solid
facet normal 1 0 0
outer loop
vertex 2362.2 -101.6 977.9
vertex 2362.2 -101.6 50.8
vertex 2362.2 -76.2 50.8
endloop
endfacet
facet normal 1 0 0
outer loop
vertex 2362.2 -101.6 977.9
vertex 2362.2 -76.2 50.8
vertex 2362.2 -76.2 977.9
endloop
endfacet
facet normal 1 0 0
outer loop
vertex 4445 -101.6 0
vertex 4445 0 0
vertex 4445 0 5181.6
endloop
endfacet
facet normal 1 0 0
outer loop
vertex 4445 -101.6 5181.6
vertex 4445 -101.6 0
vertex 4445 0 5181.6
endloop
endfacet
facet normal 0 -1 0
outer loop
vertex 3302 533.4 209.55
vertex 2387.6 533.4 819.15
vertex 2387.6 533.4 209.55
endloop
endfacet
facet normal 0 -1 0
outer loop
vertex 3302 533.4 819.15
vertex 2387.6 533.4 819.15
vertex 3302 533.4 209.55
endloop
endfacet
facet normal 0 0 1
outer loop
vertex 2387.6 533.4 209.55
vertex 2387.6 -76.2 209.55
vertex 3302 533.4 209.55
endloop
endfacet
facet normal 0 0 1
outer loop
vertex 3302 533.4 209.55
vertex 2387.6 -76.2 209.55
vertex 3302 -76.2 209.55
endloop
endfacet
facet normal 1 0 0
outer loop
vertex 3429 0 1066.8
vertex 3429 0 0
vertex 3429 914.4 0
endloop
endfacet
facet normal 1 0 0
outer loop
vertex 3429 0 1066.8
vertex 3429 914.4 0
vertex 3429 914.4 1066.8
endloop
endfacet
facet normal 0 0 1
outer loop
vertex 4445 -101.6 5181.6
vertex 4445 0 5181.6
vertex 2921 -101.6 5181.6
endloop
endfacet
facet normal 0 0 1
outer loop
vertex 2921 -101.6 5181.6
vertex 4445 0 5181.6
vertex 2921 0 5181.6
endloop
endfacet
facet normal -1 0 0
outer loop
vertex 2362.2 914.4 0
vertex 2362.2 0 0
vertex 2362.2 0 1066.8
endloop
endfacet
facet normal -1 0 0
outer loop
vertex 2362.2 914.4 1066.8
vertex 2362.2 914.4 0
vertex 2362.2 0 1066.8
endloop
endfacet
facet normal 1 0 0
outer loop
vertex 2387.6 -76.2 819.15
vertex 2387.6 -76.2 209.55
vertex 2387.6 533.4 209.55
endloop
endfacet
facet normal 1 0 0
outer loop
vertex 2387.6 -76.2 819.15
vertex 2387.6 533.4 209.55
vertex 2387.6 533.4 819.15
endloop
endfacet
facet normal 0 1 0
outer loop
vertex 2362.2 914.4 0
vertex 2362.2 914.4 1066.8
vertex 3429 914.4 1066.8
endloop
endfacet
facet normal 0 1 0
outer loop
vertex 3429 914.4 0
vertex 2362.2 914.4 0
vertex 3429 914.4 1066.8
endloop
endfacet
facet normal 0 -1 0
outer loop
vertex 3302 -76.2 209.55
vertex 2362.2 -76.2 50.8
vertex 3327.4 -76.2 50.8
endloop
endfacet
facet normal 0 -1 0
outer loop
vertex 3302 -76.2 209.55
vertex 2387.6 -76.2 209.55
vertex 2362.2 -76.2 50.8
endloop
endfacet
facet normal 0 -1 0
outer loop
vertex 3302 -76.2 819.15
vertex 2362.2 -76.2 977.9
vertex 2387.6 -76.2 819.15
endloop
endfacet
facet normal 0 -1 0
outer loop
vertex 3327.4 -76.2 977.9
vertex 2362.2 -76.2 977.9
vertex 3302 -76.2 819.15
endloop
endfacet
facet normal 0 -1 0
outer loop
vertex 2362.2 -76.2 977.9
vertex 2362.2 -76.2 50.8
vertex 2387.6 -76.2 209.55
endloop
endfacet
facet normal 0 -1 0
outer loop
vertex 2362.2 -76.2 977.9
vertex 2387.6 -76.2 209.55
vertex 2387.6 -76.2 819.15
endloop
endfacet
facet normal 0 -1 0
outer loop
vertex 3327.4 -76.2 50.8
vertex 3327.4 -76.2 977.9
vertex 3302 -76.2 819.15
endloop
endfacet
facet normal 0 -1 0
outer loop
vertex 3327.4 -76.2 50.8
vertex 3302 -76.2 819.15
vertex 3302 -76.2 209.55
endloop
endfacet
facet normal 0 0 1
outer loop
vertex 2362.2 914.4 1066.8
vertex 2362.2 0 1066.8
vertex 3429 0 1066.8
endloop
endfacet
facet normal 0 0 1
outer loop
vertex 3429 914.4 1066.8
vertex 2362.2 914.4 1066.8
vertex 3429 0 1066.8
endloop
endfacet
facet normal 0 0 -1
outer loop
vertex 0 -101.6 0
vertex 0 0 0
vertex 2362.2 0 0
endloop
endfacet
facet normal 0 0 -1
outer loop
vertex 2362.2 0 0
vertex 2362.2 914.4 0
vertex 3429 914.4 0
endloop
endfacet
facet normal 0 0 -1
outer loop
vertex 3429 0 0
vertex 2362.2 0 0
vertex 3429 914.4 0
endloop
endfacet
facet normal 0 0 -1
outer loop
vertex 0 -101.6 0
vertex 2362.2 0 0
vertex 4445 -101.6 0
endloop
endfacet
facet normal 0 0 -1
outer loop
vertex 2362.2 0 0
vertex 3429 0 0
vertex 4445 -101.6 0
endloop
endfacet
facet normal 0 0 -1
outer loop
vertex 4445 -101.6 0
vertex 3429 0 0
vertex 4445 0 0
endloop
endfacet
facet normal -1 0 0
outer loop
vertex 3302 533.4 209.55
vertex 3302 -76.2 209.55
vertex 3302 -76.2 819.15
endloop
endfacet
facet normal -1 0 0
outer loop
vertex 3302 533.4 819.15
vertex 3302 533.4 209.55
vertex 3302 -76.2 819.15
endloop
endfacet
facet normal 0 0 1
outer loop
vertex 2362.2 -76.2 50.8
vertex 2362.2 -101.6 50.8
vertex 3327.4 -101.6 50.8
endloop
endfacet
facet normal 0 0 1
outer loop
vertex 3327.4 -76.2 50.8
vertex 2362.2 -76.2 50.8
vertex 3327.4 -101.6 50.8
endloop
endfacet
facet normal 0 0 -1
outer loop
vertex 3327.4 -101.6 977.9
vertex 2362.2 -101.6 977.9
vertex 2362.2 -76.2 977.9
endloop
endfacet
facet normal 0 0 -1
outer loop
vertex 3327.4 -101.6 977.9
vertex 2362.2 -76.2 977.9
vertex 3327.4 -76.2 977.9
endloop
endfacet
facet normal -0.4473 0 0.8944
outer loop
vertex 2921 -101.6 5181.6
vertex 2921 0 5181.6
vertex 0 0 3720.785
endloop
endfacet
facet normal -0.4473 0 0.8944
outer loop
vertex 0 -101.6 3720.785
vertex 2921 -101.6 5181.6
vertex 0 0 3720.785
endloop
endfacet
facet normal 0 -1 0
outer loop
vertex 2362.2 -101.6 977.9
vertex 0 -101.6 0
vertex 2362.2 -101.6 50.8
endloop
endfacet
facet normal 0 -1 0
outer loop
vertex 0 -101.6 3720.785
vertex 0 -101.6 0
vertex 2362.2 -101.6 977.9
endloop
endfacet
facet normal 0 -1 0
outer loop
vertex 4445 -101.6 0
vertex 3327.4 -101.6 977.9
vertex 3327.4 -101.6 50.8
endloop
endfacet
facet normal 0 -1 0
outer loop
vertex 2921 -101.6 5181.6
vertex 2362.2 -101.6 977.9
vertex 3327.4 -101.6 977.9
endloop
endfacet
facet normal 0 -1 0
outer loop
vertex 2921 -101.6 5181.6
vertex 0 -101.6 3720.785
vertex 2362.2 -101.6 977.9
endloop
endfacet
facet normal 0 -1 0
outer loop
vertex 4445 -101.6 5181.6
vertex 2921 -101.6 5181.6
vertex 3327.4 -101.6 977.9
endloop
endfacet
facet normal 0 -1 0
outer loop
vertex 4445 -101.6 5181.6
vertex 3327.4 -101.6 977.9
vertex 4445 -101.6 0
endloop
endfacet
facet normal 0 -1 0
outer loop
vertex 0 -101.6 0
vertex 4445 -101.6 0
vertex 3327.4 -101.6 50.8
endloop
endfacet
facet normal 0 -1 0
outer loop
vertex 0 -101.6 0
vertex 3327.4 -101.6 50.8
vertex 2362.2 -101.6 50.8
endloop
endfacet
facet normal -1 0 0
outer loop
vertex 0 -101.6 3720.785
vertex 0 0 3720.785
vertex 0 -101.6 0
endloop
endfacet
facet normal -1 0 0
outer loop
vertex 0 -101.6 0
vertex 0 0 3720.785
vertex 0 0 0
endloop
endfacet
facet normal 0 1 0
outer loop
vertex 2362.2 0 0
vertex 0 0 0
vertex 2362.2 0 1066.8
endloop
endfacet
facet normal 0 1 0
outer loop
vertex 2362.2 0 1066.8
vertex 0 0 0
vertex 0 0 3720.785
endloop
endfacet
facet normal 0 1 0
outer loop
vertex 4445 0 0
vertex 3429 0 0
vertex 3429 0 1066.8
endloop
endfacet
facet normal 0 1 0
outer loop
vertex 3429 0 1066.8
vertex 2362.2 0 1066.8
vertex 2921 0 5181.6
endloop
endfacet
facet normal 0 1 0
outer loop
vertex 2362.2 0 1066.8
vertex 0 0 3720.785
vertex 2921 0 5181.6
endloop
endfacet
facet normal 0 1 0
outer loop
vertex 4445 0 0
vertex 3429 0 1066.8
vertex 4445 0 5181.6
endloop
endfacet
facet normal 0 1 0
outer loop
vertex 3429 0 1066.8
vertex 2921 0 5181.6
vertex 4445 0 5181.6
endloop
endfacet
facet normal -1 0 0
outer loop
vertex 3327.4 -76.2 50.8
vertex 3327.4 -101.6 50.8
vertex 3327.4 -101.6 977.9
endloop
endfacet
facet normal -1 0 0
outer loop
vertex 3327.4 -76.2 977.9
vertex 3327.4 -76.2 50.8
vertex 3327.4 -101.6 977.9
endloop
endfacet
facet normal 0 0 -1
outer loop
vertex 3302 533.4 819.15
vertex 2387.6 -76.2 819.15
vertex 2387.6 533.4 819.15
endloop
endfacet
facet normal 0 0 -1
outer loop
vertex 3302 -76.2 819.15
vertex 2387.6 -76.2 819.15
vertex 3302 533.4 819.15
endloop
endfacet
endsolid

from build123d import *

# Parameters (mm, degrees)
F1_DEPTH = 101.6
F2_W     = 1066.8
F2_H     = 1066.8
F3_DEPTH = 1016
F4_W     = 965.2
F4_H     = 927.1
F5_DEPTH = 25.4
F6_W     = 914.4
F6_H     = 609.6
F7_DEPTH = 609.6


with BuildPart() as f1:
    # F0 (on Front) → F1 (new body)
    with BuildSketch(Plane.XZ):
        Polygon((0, 3720.784616), (0, 0), (4445, 0), (4445, 5181.6), (2921, 5181.6), align=None)
    extrude(amount=F1_DEPTH)

    # F2 (on face) → F3 (join)
    with BuildSketch(Plane.XZ.offset(101.6)):
        with Locations((2895.6, 533.4)):
            Rectangle(F2_W, F2_H)
    extrude(amount=-F3_DEPTH)

    # F4 (on face) → F5 (cut)
    with BuildSketch(Plane.XZ.offset(101.6)):
        with Locations((2844.8, 514.35)):
            Rectangle(F4_W, F4_H)
    extrude(amount=-F5_DEPTH, mode=Mode.SUBTRACT)

    # F6 (on face) → F7 (cut)
    with BuildSketch(Plane.XZ.offset(76.2)):
        with Locations((2844.8, 514.35)):
            Rectangle(F6_W, F6_H)
    extrude(amount=-F7_DEPTH, mode=Mode.SUBTRACT)


solid = f1.part
